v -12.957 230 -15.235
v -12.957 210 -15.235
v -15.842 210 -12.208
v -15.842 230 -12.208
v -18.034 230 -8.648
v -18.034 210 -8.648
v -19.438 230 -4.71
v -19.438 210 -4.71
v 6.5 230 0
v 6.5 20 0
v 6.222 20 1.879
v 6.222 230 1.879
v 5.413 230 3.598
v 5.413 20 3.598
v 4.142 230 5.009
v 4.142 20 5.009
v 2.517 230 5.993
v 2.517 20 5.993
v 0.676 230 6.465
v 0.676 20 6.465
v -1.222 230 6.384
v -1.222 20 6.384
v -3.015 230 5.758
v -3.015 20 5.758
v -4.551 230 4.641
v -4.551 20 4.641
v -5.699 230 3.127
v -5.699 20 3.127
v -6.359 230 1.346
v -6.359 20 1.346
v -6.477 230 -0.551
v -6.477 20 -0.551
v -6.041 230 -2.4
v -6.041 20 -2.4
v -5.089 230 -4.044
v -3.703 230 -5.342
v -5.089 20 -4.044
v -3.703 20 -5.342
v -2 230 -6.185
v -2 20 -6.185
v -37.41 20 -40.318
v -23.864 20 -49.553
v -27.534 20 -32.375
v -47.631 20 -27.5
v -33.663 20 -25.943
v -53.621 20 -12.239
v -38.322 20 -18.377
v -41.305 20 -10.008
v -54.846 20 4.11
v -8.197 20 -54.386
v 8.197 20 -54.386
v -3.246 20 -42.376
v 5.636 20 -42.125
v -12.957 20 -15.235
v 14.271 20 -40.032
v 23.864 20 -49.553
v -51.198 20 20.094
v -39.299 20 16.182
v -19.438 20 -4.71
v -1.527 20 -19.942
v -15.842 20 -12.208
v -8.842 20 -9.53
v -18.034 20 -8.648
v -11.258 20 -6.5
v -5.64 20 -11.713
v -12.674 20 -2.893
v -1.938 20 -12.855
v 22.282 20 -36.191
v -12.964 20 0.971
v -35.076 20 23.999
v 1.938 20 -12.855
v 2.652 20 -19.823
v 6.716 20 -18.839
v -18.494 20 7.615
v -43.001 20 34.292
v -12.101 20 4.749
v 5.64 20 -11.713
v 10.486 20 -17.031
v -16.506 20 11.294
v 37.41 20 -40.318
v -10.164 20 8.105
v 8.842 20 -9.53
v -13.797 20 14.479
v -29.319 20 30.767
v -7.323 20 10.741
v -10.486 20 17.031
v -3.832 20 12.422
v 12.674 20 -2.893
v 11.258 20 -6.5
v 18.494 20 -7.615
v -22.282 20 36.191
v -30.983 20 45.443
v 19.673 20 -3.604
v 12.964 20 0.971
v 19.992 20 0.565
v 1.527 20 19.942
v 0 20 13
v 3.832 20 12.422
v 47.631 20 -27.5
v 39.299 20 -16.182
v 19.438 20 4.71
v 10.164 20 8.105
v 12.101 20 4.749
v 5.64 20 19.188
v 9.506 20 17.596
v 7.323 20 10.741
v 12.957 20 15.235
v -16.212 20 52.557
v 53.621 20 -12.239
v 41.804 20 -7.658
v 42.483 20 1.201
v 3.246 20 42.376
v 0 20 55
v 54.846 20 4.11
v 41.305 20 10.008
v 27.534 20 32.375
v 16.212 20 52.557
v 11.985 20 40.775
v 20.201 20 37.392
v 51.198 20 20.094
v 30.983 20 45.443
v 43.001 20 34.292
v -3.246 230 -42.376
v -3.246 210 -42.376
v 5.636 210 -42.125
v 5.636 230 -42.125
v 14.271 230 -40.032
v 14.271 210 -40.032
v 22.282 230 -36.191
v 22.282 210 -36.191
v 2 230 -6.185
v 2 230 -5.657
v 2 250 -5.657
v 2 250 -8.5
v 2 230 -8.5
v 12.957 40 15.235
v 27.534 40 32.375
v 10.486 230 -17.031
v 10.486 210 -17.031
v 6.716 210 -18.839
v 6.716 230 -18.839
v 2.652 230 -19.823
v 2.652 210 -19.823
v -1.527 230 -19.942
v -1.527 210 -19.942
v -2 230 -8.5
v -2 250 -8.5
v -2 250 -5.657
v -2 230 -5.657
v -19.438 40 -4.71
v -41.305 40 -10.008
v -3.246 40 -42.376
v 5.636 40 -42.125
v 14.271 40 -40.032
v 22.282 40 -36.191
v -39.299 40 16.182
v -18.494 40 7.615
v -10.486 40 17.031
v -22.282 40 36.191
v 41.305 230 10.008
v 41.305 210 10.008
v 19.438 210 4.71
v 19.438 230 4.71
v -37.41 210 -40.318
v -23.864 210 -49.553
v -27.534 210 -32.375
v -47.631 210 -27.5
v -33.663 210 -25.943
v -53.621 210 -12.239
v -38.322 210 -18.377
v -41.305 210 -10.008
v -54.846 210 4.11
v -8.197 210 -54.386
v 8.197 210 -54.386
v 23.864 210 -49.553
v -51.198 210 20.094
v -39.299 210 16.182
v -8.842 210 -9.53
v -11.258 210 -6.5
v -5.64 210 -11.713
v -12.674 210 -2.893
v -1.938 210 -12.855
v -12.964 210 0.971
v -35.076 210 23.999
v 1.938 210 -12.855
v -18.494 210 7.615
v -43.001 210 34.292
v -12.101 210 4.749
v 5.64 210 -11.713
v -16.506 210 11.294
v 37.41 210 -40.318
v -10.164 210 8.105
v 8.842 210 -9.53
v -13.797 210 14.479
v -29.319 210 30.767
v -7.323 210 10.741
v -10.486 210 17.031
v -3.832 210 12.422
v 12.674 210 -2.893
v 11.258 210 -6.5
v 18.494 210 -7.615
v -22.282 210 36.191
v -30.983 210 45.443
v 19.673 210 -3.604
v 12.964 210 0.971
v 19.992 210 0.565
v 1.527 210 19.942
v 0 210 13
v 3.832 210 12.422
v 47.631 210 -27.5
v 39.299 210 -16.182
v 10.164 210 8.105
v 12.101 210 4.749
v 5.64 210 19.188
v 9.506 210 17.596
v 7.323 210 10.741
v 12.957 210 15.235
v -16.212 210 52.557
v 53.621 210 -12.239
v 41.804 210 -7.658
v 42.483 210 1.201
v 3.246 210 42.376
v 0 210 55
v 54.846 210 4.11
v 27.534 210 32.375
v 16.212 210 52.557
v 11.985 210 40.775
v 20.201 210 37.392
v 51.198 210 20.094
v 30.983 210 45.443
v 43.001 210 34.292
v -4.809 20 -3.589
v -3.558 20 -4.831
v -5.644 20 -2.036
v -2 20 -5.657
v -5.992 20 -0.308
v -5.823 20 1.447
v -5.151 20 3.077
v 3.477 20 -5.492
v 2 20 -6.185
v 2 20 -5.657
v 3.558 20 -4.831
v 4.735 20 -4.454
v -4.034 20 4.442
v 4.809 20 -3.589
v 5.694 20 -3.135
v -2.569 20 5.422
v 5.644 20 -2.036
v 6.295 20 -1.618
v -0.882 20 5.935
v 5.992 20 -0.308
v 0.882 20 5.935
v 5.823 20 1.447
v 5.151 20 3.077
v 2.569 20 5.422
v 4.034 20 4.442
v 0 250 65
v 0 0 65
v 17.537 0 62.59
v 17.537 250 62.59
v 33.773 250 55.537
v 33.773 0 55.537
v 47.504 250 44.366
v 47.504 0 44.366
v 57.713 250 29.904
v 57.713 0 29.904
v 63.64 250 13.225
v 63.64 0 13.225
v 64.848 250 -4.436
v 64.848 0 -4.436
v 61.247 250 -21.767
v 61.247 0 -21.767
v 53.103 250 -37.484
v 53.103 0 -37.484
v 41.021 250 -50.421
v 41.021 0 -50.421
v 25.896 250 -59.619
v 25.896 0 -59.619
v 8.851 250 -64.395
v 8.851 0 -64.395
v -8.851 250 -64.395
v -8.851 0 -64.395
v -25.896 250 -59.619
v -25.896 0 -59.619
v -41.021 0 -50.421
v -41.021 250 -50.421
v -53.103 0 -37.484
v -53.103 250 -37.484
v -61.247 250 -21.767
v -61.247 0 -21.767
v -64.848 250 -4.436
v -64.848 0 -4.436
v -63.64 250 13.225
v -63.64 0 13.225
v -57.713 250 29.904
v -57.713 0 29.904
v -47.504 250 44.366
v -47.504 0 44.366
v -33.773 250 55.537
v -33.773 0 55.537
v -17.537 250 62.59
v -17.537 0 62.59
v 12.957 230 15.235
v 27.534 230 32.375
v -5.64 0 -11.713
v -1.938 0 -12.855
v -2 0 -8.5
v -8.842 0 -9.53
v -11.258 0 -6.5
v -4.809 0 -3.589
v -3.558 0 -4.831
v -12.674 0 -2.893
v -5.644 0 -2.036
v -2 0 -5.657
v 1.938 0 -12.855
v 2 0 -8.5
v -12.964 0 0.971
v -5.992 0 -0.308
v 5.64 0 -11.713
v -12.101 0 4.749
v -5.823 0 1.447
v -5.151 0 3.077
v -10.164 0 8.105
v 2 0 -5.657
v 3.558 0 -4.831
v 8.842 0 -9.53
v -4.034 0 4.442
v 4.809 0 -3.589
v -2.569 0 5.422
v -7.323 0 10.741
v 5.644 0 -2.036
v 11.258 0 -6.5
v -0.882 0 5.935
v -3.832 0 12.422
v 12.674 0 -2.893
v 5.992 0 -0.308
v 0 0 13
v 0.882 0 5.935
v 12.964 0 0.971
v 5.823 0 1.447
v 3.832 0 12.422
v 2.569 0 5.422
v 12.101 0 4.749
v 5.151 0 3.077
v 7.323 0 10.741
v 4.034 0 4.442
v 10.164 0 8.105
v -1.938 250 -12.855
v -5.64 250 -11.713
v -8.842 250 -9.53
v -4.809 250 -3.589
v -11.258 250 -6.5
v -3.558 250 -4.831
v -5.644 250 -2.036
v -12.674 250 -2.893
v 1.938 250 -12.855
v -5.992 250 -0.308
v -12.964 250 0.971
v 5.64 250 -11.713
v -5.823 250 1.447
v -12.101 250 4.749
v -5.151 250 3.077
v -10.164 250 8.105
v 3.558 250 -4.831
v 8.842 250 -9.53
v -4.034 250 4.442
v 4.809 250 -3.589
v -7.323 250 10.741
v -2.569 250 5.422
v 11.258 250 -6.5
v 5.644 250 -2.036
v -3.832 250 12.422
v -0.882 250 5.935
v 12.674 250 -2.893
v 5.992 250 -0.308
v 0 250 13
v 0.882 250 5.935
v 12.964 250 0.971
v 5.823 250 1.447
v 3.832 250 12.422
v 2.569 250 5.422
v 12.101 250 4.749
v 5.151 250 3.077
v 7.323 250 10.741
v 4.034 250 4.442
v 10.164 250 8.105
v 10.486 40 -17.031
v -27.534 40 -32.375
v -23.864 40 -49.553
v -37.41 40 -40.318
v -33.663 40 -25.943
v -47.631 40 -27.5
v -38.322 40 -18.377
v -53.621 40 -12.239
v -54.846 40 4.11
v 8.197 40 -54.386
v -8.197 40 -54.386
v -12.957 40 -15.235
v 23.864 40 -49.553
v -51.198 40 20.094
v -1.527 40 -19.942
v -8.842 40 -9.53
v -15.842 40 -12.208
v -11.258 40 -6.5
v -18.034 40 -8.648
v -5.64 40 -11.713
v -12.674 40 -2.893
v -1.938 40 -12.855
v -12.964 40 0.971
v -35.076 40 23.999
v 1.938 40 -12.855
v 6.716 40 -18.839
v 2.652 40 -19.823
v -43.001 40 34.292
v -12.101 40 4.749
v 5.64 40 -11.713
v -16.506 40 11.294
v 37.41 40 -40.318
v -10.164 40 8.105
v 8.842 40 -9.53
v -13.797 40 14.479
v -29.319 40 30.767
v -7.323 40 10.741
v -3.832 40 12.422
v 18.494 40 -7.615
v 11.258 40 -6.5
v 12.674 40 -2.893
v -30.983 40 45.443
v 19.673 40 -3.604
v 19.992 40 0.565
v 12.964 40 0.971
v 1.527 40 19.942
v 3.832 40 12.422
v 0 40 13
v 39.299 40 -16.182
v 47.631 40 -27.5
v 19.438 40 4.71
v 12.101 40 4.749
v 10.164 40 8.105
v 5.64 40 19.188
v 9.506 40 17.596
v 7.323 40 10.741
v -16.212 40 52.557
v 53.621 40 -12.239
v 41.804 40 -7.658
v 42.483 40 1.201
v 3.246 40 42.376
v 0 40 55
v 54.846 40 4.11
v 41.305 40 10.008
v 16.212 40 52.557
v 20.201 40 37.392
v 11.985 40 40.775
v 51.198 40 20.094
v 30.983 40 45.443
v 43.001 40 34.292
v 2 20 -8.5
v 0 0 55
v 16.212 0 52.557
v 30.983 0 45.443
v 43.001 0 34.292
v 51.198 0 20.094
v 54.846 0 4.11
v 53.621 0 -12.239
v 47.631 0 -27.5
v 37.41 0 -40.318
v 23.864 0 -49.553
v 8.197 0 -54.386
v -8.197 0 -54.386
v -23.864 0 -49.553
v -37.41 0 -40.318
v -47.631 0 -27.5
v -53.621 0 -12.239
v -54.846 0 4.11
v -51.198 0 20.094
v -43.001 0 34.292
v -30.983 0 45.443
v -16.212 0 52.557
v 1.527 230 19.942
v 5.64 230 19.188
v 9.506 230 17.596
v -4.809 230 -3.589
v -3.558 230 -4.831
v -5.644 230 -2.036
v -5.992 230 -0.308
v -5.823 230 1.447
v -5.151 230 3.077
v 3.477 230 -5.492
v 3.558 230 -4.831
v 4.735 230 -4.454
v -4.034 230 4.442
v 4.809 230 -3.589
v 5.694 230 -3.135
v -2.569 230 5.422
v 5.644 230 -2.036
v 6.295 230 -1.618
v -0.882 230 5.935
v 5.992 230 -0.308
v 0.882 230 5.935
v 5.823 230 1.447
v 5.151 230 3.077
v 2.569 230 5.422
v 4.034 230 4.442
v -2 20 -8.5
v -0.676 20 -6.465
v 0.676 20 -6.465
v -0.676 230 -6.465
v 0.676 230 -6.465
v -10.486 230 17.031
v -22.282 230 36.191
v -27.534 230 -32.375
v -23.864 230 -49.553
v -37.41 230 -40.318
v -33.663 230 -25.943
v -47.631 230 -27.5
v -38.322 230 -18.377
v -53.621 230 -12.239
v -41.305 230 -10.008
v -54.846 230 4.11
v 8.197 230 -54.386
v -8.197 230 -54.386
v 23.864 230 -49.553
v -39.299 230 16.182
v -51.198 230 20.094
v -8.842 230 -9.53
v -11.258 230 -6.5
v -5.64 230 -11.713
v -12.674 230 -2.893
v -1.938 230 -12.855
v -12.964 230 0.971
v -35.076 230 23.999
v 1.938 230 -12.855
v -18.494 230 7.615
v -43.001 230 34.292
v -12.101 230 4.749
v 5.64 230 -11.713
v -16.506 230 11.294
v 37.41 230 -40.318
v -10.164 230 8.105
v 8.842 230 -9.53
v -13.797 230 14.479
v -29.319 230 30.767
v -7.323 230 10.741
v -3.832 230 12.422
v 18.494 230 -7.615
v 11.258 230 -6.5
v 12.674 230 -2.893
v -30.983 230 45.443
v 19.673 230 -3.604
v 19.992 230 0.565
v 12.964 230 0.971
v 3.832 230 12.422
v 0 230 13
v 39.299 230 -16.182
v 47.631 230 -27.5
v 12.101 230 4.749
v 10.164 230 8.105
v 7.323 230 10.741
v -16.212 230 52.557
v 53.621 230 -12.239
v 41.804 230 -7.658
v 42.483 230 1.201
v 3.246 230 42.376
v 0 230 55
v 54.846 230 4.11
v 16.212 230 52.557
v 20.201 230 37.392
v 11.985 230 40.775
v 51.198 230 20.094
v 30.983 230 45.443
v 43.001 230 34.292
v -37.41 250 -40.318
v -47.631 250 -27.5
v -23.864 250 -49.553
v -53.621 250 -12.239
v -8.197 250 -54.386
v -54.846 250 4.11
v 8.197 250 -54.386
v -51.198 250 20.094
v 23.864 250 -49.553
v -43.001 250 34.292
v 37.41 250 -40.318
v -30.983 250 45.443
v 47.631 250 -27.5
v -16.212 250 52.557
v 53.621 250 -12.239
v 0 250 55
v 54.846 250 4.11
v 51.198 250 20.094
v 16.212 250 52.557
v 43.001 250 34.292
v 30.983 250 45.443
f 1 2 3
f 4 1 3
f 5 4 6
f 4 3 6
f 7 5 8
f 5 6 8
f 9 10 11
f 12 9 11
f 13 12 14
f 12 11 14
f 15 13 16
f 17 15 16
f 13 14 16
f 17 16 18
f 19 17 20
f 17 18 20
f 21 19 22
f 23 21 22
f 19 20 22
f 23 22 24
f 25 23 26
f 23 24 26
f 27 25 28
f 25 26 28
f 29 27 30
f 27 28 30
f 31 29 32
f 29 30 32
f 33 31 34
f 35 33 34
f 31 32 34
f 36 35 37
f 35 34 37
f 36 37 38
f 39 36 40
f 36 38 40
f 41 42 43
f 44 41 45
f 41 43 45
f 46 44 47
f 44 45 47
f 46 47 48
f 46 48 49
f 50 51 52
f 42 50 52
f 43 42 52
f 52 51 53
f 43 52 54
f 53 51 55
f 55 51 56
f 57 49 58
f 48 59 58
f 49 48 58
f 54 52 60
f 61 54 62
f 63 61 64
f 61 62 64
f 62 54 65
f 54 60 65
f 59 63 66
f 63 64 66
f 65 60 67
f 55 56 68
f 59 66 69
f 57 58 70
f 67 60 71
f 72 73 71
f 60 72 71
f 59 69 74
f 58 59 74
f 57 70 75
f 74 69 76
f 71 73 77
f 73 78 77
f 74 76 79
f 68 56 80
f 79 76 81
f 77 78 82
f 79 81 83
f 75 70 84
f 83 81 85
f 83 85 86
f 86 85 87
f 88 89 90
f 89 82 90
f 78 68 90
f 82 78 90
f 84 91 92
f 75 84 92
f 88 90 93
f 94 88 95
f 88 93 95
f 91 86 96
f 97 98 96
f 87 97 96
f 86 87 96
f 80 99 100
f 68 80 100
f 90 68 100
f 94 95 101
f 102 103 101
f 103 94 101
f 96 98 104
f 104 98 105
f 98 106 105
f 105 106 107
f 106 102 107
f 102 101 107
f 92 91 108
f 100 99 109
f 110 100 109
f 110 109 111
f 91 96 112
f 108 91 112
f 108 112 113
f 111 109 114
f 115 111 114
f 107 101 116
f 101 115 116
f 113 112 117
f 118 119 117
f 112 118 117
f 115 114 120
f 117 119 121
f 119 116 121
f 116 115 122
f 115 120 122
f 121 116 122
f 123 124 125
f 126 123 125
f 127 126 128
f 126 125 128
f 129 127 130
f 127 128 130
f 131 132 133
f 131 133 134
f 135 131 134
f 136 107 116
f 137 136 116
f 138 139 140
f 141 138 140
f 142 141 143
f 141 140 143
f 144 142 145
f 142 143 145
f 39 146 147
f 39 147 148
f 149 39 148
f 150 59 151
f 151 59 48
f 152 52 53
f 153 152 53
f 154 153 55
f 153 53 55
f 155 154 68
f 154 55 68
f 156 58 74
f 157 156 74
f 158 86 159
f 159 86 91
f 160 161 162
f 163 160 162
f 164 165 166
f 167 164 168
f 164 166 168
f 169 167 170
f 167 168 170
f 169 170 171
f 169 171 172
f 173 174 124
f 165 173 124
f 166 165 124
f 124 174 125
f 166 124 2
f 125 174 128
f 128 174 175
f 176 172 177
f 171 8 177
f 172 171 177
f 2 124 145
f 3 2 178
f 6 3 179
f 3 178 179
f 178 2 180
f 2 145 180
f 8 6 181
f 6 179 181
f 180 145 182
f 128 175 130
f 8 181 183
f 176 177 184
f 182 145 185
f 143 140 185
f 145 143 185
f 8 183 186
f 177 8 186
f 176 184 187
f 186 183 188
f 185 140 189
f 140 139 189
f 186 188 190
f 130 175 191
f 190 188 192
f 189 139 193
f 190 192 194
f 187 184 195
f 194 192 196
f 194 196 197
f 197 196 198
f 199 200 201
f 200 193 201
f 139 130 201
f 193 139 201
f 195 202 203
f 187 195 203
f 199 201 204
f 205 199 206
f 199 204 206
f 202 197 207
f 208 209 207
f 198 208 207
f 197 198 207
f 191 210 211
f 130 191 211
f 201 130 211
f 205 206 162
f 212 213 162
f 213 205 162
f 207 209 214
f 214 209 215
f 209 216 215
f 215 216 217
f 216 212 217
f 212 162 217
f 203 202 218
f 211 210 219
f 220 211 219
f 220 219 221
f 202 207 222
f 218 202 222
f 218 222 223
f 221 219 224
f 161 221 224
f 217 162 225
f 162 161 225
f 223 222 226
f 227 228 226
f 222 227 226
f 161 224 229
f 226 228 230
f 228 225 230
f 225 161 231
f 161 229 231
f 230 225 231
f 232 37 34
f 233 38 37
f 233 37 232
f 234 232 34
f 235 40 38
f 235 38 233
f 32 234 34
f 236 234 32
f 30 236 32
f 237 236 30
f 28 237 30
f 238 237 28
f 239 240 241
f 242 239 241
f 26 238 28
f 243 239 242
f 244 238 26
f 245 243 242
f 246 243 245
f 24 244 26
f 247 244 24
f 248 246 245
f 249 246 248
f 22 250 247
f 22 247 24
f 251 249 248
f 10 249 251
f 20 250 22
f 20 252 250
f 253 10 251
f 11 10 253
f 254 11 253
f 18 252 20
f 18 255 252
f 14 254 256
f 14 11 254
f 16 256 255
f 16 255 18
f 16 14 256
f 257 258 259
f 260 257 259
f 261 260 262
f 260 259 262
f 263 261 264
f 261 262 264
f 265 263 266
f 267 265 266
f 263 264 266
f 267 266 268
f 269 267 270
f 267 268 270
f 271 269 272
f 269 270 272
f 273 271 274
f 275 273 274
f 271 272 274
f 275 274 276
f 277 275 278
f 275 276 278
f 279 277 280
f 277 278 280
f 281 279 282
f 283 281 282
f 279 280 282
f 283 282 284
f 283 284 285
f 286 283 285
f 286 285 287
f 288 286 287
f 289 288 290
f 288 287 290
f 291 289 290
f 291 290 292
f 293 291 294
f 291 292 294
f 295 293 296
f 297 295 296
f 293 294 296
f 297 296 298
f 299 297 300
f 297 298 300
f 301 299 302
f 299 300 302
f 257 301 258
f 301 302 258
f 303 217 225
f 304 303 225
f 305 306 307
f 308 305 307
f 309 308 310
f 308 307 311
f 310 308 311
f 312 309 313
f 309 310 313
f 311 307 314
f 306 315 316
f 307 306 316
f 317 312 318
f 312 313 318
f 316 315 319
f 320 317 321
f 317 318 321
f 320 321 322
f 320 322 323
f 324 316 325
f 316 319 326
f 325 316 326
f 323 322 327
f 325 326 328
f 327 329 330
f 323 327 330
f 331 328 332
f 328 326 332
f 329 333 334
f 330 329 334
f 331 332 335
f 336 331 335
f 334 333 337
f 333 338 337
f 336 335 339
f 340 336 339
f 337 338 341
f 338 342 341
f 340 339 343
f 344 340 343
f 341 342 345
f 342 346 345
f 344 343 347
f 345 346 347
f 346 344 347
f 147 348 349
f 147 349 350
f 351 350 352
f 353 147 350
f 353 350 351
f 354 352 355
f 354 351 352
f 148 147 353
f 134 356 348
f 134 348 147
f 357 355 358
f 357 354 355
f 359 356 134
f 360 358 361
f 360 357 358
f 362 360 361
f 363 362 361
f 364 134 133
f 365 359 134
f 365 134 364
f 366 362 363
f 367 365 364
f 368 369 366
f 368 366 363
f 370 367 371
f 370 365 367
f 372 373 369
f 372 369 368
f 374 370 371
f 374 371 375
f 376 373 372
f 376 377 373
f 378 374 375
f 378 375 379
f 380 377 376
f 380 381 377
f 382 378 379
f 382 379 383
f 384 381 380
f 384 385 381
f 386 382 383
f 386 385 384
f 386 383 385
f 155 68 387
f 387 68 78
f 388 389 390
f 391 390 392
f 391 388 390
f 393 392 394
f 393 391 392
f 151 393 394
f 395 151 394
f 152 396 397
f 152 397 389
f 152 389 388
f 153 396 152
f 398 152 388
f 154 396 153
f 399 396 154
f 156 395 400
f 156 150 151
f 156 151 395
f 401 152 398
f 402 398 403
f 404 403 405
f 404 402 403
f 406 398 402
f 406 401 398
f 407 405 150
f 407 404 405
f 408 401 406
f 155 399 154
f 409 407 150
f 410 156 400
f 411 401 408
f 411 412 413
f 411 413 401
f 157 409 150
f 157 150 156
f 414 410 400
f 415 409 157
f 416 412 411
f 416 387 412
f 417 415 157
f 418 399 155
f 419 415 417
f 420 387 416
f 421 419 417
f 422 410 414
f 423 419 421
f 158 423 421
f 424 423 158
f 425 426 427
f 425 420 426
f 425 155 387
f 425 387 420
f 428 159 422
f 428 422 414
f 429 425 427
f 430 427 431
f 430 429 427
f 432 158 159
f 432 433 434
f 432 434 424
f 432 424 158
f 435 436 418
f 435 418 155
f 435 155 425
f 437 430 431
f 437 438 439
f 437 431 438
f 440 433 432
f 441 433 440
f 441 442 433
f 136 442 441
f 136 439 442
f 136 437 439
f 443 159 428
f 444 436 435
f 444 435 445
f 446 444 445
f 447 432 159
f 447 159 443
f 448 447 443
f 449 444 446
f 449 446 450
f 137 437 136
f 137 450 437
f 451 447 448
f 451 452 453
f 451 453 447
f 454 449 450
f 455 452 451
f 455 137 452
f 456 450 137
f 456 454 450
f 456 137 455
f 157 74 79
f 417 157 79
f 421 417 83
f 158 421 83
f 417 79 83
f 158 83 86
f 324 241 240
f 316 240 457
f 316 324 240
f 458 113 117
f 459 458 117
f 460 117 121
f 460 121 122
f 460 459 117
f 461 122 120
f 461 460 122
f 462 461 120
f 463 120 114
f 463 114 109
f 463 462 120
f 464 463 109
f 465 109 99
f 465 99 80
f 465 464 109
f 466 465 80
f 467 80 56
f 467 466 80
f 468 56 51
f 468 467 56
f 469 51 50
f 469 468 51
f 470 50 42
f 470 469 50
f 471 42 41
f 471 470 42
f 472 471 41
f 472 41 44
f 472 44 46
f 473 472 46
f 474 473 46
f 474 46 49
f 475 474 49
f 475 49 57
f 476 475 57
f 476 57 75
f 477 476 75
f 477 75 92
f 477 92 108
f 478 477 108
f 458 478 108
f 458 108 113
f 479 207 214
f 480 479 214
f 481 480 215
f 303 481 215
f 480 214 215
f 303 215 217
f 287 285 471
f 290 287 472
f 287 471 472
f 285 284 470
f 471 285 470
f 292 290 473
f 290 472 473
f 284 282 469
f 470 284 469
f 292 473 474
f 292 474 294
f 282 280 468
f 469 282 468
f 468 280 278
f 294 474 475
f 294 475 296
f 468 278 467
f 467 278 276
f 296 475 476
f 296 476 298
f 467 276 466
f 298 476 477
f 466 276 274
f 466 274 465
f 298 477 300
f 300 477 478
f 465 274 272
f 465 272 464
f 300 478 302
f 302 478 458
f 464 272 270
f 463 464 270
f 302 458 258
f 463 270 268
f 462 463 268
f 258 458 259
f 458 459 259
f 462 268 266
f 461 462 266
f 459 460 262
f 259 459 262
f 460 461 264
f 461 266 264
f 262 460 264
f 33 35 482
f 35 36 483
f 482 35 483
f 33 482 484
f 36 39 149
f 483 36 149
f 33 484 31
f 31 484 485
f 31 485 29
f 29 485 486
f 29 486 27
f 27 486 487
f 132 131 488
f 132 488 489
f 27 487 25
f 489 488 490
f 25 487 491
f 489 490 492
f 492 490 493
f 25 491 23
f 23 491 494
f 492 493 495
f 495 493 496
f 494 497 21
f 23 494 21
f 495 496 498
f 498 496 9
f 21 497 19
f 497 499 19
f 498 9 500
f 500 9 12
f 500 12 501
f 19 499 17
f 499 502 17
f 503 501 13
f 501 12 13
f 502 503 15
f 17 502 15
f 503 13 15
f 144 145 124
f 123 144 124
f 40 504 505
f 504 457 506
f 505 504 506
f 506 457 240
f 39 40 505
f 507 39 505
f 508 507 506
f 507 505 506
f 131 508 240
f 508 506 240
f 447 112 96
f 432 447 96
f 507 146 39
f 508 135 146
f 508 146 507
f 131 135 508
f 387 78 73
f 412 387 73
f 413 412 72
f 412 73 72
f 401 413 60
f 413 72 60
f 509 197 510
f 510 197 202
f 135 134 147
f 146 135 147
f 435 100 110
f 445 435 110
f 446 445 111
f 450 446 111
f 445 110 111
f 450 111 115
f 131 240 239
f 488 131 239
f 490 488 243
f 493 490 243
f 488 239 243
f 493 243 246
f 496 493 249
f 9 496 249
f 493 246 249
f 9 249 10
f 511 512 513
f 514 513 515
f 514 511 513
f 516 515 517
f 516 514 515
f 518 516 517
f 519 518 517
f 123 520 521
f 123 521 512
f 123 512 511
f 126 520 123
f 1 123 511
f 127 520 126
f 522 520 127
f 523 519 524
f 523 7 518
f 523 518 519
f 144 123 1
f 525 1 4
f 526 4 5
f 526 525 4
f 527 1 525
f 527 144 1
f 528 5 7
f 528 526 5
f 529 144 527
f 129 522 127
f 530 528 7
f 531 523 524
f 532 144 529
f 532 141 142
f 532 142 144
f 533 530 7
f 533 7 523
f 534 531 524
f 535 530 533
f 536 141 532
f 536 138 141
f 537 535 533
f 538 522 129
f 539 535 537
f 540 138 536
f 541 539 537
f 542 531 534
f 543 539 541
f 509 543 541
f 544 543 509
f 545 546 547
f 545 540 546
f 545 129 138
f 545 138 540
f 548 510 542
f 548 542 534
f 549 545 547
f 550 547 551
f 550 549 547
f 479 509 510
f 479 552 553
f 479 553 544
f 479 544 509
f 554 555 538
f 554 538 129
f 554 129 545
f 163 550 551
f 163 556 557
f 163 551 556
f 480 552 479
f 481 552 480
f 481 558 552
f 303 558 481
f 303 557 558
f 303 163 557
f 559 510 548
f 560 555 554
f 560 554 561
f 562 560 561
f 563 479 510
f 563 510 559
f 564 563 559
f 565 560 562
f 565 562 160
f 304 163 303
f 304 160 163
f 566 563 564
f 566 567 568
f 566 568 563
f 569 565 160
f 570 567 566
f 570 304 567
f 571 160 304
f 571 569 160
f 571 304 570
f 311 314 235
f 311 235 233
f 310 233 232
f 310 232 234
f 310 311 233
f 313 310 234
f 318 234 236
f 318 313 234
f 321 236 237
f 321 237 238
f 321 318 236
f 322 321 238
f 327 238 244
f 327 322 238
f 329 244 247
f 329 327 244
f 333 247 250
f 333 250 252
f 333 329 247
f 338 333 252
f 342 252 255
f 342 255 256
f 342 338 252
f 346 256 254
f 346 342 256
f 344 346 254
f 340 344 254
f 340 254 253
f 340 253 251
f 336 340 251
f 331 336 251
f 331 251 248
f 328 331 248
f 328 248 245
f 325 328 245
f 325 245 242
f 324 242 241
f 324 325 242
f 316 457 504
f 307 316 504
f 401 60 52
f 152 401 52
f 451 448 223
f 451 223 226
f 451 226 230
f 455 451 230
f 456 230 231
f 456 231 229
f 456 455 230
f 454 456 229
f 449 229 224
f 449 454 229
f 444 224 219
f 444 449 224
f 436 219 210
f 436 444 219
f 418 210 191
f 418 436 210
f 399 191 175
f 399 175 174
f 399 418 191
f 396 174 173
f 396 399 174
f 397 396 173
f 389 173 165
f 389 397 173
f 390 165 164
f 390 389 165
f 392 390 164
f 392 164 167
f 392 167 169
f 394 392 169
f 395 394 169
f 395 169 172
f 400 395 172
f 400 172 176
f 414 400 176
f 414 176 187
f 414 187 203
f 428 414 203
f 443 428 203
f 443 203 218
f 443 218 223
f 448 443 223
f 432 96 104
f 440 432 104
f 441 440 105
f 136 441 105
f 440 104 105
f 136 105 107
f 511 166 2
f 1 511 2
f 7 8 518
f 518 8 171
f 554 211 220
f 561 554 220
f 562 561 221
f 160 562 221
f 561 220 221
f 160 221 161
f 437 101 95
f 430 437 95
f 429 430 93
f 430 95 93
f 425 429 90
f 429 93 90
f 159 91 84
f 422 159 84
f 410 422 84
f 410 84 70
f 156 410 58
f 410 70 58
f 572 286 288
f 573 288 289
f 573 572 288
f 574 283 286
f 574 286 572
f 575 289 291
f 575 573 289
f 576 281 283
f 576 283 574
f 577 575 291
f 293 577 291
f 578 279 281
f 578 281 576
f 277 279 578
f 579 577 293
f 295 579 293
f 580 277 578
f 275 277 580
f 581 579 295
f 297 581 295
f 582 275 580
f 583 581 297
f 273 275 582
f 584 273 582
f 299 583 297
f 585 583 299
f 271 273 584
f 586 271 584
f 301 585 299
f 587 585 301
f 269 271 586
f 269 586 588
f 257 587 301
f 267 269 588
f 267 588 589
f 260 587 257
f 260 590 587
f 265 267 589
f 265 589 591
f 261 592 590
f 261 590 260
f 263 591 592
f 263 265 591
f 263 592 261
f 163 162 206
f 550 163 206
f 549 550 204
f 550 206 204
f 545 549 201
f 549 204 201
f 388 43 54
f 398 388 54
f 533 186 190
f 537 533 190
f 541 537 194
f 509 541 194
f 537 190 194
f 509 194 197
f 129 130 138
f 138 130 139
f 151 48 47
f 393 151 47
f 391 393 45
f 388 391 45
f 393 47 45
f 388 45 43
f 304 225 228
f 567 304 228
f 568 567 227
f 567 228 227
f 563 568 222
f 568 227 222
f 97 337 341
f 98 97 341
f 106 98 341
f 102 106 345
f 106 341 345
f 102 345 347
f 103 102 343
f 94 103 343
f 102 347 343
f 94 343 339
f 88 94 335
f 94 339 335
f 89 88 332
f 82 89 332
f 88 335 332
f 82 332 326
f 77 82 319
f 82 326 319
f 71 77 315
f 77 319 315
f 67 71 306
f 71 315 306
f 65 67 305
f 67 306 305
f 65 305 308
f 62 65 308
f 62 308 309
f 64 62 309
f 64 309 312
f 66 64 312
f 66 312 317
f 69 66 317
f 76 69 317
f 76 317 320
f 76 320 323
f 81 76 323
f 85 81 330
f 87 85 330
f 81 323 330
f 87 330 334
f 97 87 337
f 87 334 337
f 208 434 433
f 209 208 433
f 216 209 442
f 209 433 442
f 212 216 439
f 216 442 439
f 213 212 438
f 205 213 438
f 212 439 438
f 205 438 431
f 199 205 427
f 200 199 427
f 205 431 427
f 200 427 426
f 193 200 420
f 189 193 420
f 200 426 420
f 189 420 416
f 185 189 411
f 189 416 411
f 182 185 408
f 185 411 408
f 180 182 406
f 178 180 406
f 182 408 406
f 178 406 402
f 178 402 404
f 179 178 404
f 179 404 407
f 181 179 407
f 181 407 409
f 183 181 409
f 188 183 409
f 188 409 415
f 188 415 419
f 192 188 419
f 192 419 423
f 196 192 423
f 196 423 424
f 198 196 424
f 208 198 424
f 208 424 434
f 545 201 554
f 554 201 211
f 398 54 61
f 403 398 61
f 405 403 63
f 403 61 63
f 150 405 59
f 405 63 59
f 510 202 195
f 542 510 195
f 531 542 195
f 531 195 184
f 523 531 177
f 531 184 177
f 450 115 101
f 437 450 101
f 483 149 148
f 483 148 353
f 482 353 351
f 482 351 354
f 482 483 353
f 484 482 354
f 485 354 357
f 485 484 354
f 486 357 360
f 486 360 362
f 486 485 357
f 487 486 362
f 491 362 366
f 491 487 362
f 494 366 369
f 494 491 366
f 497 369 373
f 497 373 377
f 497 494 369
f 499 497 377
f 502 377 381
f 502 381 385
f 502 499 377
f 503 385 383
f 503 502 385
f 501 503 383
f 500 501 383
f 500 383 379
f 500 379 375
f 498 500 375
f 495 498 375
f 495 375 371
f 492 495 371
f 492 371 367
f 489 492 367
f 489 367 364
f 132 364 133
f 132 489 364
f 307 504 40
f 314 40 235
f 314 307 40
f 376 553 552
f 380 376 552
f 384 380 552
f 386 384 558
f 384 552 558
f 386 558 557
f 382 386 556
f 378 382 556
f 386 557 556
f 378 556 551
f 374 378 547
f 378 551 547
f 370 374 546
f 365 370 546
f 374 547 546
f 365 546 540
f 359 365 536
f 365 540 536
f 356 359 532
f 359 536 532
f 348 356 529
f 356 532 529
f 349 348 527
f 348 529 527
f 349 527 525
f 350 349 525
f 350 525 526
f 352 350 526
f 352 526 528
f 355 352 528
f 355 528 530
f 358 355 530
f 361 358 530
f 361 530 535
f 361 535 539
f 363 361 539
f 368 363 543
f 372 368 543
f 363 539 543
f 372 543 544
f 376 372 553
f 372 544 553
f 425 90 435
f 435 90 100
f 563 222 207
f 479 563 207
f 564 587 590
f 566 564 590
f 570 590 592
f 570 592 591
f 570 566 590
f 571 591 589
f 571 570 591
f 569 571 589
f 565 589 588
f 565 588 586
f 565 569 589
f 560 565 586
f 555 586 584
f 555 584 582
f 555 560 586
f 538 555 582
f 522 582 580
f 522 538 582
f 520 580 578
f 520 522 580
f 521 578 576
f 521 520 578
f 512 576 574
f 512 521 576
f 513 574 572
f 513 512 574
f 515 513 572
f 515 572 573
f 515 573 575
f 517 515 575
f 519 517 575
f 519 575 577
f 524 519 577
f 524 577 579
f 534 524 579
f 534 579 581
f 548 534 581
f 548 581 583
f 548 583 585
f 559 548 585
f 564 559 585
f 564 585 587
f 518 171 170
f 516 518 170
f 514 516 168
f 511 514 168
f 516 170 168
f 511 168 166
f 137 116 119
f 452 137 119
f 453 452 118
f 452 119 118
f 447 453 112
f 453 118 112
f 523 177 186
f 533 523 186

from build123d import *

# Parameters (mm, degrees)
SKETCH1_R           = 65
SKETCH1_R_2         = 55
BOSS_EXTRUDE1_DEPTH = 250
BOSS_EXTRUDE2_START = 20
SKETCH3_R           = 55
SKETCH3_R_2         = 13
BOSS_EXTRUDE2_DEPTH = 20
BOSS_EXTRUDE3_START = 210
SKETCH3_5_R         = 55
SKETCH3_5_R_2       = 13
BOSS_EXTRUDE3_DEPTH = 20
BOSS_EXTRUDE4_START = 20
SKETCH3_7_R         = 13
SKETCH3_7_R_2       = 6.5
BOSS_EXTRUDE4_DEPTH = 210
SKETCH3_10_R        = 13
BOSS_EXTRUDE5_DEPTH = 20
BOSS_EXTRUDE6_START = 230
SKETCH3_11_R        = 13
BOSS_EXTRUDE6_DEPTH = 20


with BuildPart() as part:
    # Sketch1 → Boss-Extrude1 (new body)
    with BuildSketch(Plane(origin=(0, 0, 0), x_dir=(1, 0, 0), z_dir=(0, 1, 0))):
        Circle(SKETCH1_R)
        Circle(SKETCH1_R_2, mode=Mode.SUBTRACT)
    extrude(amount=BOSS_EXTRUDE1_DEPTH)

    # Sketch3 → Boss-Extrude2 (add)
    with BuildSketch(Plane(origin=(0, 0, 0), x_dir=(1, 0, 0), z_dir=(0, 1, 0)).offset(BOSS_EXTRUDE2_START)):
        Circle(SKETCH3_R)
        with BuildLine():
            ThreePointArc((1.527466732, -19.941585829), (7.614996105, -18.493561969), (12.957116602, -15.235259412))
            Line((12.957116602, -15.235259412), (27.53387278, -32.374926251))
            ThreePointArc((27.53387278, -32.374926251), (16.181866723, -39.298819185), (3.245866806, -42.375869887))
            Line((3.245866806, -42.375869887), (1.527466732, -19.941585829))
        make_face(mode=Mode.SUBTRACT)
        with BuildLine():
            ThreePointArc((-18.493561969, -7.614996105), (-15.235259412, -12.957116602), (-10.485623513, -17.030904249))
            Line((-10.485623513, -17.030904249), (-22.281949965, -36.190671529))
            ThreePointArc((-22.281949965, -36.190671529), (-32.374926251, -27.53387278), (-39.298819185, -16.181866723))
            Line((-39.298819185, -16.181866723), (-18.493561969, -7.614996105))
        make_face(mode=Mode.SUBTRACT)
        with BuildLine():
            ThreePointArc((-12.957116602, 15.235259412), (-17.030904249, 10.485623513), (-19.437588327, 4.709581727))
            Line((-19.437588327, 4.709581727), (-41.304875194, 10.00786117))
            ThreePointArc((-41.304875194, 10.00786117), (-36.190671529, 22.281949965), (-27.53387278, 32.374926251))
            Line((-27.53387278, 32.374926251), (-12.957116602, 15.235259412))
        make_face(mode=Mode.SUBTRACT)
        with BuildLine():
            ThreePointArc((10.485623513, 17.030904249), (4.709581727, 19.437588327), (-1.527466732, 19.941585829))
            Line((-1.527466732, 19.941585829), (-3.245866806, 42.375869887))
            ThreePointArc((-3.245866806, 42.375869887), (10.00786117, 41.304875194), (22.281949965, 36.190671529))
            Line((22.281949965, 36.190671529), (10.485623513, 17.030904249))
        make_face(mode=Mode.SUBTRACT)
        with BuildLine():
            Line((18.493561969, 7.614996105), (39.298819185, 16.181866723))
            ThreePointArc((39.298819185, 16.181866723), (42.375869887, 3.245866806), (41.304875194, -10.00786117))
            Line((41.304875194, -10.00786117), (19.437588327, -4.709581727))
            ThreePointArc((19.437588327, -4.709581727), (19.941585829, 1.527466732), (18.493561969, 7.614996105))
        make_face(mode=Mode.SUBTRACT)
        Circle(SKETCH3_R_2, mode=Mode.SUBTRACT)
    extrude(amount=BOSS_EXTRUDE2_DEPTH)

    # Sketch3<5> → Boss-Extrude3 (add)
    with BuildSketch(Plane(origin=(0, 0, 0), x_dir=(1, 0, 0), z_dir=(0, 1, 0)).offset(BOSS_EXTRUDE3_START)):
        Circle(SKETCH3_5_R)
        with BuildLine():
            ThreePointArc((1.527466732, -19.941585829), (7.614996105, -18.493561969), (12.957116602, -15.235259412))
            Line((12.957116602, -15.235259412), (27.53387278, -32.374926251))
            ThreePointArc((27.53387278, -32.374926251), (16.181866723, -39.298819185), (3.245866806, -42.375869887))
            Line((3.245866806, -42.375869887), (1.527466732, -19.941585829))
        make_face(mode=Mode.SUBTRACT)
        with BuildLine():
            ThreePointArc((-18.493561969, -7.614996105), (-15.235259412, -12.957116602), (-10.485623513, -17.030904249))
            Line((-10.485623513, -17.030904249), (-22.281949965, -36.190671529))
            ThreePointArc((-22.281949965, -36.190671529), (-32.374926251, -27.53387278), (-39.298819185, -16.181866723))
            Line((-39.298819185, -16.181866723), (-18.493561969, -7.614996105))
        make_face(mode=Mode.SUBTRACT)
        with BuildLine():
            ThreePointArc((-12.957116602, 15.235259412), (-17.030904249, 10.485623513), (-19.437588327, 4.709581727))
            Line((-19.437588327, 4.709581727), (-41.304875194, 10.00786117))
            ThreePointArc((-41.304875194, 10.00786117), (-36.190671529, 22.281949965), (-27.53387278, 32.374926251))
            Line((-27.53387278, 32.374926251), (-12.957116602, 15.235259412))
        make_face(mode=Mode.SUBTRACT)
        with BuildLine():
            ThreePointArc((10.485623513, 17.030904249), (4.709581727, 19.437588327), (-1.527466732, 19.941585829))
            Line((-1.527466732, 19.941585829), (-3.245866806, 42.375869887))
            ThreePointArc((-3.245866806, 42.375869887), (10.00786117, 41.304875194), (22.281949965, 36.190671529))
            Line((22.281949965, 36.190671529), (10.485623513, 17.030904249))
        make_face(mode=Mode.SUBTRACT)
        with BuildLine():
            Line((18.493561969, 7.614996105), (39.298819185, 16.181866723))
            ThreePointArc((39.298819185, 16.181866723), (42.375869887, 3.245866806), (41.304875194, -10.00786117))
            Line((41.304875194, -10.00786117), (19.437588327, -4.709581727))
            ThreePointArc((19.437588327, -4.709581727), (19.941585829, 1.527466732), (18.493561969, 7.614996105))
        make_face(mode=Mode.SUBTRACT)
        Circle(SKETCH3_5_R_2, mode=Mode.SUBTRACT)
    extrude(amount=BOSS_EXTRUDE3_DEPTH)

    # Sketch3<7> → Boss-Extrude4 (add)
    with BuildSketch(Plane(origin=(0, 0, 0), x_dir=(1, 0, 0), z_dir=(0, 1, 0)).offset(BOSS_EXTRUDE4_START)):
        Circle(SKETCH3_7_R)
        Circle(SKETCH3_7_R_2, mode=Mode.SUBTRACT)
    extrude(amount=BOSS_EXTRUDE4_DEPTH)

    # Sketch3<10> → Boss-Extrude5 (add)
    with BuildSketch(Plane(origin=(0, 0, 0), x_dir=(1, 0, 0), z_dir=(0, 1, 0))):
        Circle(SKETCH3_10_R)
        with BuildLine():
            ThreePointArc((2, 5.656854249), (0, -6), (-2, 5.656854249))
            Line((-2, 5.656854249), (-2, 8.5))
            Line((-2, 8.5), (2, 8.5))
            Line((2, 8.5), (2, 5.656854249))
        make_face(mode=Mode.SUBTRACT)
    extrude(amount=BOSS_EXTRUDE5_DEPTH)

    # Sketch3<11> → Boss-Extrude6 (add)
    with BuildSketch(Plane(origin=(0, 0, 0), x_dir=(1, 0, 0), z_dir=(0, 1, 0)).offset(BOSS_EXTRUDE6_START)):
        Circle(SKETCH3_11_R)
        with BuildLine():
            ThreePointArc((2, 5.656854249), (0, -6), (-2, 5.656854249))
            Line((-2, 5.656854249), (-2, 8.5))
            Line((-2, 8.5), (2, 8.5))
            Line((2, 8.5), (2, 5.656854249))
        make_face(mode=Mode.SUBTRACT)
    extrude(amount=BOSS_EXTRUDE6_DEPTH)


solid = part.part
